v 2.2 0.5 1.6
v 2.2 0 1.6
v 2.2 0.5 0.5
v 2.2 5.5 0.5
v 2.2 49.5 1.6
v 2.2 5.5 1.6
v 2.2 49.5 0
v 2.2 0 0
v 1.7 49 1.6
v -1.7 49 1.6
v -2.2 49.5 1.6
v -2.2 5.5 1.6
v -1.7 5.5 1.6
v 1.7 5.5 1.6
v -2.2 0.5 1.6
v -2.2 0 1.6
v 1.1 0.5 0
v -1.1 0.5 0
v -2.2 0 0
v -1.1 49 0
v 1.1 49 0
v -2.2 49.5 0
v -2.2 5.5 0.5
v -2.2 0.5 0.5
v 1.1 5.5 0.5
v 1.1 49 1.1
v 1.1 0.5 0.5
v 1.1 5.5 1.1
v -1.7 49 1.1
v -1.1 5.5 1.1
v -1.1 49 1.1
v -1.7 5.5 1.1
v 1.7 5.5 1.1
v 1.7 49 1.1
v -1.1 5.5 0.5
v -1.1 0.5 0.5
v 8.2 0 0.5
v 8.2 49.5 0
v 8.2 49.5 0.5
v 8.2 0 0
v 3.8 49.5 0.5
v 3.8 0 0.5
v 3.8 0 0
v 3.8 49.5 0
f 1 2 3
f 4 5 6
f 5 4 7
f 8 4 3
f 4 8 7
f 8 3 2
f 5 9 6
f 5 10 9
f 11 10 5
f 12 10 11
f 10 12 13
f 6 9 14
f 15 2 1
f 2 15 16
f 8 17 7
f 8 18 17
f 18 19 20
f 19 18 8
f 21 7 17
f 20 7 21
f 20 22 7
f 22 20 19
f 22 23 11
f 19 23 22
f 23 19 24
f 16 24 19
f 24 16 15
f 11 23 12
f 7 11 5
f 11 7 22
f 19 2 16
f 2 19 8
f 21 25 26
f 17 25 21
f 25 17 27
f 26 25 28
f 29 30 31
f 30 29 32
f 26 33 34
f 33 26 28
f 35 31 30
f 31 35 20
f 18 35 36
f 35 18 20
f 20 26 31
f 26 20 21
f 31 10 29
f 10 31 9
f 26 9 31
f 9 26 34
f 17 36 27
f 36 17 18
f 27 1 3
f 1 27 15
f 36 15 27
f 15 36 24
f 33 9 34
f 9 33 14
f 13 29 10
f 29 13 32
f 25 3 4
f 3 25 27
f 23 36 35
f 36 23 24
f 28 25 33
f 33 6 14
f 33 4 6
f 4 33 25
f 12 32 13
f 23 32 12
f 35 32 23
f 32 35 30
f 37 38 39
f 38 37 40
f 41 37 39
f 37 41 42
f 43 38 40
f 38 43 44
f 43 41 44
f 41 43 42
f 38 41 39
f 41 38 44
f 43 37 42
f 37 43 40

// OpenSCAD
// file: consts.scad
STRIPE_X = 3.4; //width of the LED stripe pcb
STRIPE_Y = 48.5; //length of LED stripe pcb
STRIPE_Z = 0.6; //pcb thickness of LED stripe pcb
LED_X=2; //edge length of LED (assumed to be square)
LED_Z = 1; //LED height above PCB

FIL_D = 0.25; //fiber diameter
NOZ_D = 0.4; //nozzle diameter
CLIP_Z = 5; //height of clip
N = 64; //number of fibers

D_I = 11.6; //inner diameter of pen
D_O = D_I+4*NOZ_D; //outer diameter of pen

CLIP_X = 2*FIL_D+4*NOZ_D;
CLIP_L = 2*N*FIL_D+4*NOZ_D;

CAP_H = 3; //height of cap cylinder attached to clip

PEN_UPPER_Z = 60; //height of upper pen part 
PEN_LOWER_BODY_Z = 60; //height of the cylindrical part
PEN_LOWER_TIP_Z = 20; //height of the tip cone

FIBER_CLAMP_Z = 2;
FIBER_CLAMP_X = 1.2;

STRIPE_JOINER_Z = 3; //height of the 4stripe joiner
// main file
include <consts.scad>

//This is the two-part LED pcb holder that joins LEDs and fibers
//
//Print with normal PLA


CABLES_Y = 5;
BASE_PLATE_Z = 0;
STRIPE_DIST = 2;
NUM_STRIPES=4;

module stripeholder() {
   
    difference() {
    //base plate
    translate([0, (STRIPE_Y+1)/2, (BASE_PLATE_Z+LED_Z+STRIPE_Z)/2])cube([STRIPE_X+1, STRIPE_Y+1, BASE_PLATE_Z+LED_Z+STRIPE_Z], center=true);
    //led cutout
    translate([0, STRIPE_Y/2+0.5, (LED_Z+0.1)/2+BASE_PLATE_Z])cube([LED_X+0.2, STRIPE_Y, LED_Z+0.1], center=true);
    //pcb cutout
    translate([0, STRIPE_Y/2+0.5, (STRIPE_Z)/2+BASE_PLATE_Z+LED_Z+0.1])cube([STRIPE_X, STRIPE_Y, STRIPE_Z], center=true);
    //cable cutout
    translate([0, CABLES_Y/2+0.5, (LED_Z+STRIPE_Z)/2+BASE_PLATE_Z+0.5])cube([STRIPE_X+1, CABLES_Y, LED_Z+STRIPE_Z], center=true); 
    }
}


stripeholder();
translate([6,(STRIPE_Y+1)/2,0.5/2])cube([STRIPE_X+1, STRIPE_Y+1, 0.5], center=true);
